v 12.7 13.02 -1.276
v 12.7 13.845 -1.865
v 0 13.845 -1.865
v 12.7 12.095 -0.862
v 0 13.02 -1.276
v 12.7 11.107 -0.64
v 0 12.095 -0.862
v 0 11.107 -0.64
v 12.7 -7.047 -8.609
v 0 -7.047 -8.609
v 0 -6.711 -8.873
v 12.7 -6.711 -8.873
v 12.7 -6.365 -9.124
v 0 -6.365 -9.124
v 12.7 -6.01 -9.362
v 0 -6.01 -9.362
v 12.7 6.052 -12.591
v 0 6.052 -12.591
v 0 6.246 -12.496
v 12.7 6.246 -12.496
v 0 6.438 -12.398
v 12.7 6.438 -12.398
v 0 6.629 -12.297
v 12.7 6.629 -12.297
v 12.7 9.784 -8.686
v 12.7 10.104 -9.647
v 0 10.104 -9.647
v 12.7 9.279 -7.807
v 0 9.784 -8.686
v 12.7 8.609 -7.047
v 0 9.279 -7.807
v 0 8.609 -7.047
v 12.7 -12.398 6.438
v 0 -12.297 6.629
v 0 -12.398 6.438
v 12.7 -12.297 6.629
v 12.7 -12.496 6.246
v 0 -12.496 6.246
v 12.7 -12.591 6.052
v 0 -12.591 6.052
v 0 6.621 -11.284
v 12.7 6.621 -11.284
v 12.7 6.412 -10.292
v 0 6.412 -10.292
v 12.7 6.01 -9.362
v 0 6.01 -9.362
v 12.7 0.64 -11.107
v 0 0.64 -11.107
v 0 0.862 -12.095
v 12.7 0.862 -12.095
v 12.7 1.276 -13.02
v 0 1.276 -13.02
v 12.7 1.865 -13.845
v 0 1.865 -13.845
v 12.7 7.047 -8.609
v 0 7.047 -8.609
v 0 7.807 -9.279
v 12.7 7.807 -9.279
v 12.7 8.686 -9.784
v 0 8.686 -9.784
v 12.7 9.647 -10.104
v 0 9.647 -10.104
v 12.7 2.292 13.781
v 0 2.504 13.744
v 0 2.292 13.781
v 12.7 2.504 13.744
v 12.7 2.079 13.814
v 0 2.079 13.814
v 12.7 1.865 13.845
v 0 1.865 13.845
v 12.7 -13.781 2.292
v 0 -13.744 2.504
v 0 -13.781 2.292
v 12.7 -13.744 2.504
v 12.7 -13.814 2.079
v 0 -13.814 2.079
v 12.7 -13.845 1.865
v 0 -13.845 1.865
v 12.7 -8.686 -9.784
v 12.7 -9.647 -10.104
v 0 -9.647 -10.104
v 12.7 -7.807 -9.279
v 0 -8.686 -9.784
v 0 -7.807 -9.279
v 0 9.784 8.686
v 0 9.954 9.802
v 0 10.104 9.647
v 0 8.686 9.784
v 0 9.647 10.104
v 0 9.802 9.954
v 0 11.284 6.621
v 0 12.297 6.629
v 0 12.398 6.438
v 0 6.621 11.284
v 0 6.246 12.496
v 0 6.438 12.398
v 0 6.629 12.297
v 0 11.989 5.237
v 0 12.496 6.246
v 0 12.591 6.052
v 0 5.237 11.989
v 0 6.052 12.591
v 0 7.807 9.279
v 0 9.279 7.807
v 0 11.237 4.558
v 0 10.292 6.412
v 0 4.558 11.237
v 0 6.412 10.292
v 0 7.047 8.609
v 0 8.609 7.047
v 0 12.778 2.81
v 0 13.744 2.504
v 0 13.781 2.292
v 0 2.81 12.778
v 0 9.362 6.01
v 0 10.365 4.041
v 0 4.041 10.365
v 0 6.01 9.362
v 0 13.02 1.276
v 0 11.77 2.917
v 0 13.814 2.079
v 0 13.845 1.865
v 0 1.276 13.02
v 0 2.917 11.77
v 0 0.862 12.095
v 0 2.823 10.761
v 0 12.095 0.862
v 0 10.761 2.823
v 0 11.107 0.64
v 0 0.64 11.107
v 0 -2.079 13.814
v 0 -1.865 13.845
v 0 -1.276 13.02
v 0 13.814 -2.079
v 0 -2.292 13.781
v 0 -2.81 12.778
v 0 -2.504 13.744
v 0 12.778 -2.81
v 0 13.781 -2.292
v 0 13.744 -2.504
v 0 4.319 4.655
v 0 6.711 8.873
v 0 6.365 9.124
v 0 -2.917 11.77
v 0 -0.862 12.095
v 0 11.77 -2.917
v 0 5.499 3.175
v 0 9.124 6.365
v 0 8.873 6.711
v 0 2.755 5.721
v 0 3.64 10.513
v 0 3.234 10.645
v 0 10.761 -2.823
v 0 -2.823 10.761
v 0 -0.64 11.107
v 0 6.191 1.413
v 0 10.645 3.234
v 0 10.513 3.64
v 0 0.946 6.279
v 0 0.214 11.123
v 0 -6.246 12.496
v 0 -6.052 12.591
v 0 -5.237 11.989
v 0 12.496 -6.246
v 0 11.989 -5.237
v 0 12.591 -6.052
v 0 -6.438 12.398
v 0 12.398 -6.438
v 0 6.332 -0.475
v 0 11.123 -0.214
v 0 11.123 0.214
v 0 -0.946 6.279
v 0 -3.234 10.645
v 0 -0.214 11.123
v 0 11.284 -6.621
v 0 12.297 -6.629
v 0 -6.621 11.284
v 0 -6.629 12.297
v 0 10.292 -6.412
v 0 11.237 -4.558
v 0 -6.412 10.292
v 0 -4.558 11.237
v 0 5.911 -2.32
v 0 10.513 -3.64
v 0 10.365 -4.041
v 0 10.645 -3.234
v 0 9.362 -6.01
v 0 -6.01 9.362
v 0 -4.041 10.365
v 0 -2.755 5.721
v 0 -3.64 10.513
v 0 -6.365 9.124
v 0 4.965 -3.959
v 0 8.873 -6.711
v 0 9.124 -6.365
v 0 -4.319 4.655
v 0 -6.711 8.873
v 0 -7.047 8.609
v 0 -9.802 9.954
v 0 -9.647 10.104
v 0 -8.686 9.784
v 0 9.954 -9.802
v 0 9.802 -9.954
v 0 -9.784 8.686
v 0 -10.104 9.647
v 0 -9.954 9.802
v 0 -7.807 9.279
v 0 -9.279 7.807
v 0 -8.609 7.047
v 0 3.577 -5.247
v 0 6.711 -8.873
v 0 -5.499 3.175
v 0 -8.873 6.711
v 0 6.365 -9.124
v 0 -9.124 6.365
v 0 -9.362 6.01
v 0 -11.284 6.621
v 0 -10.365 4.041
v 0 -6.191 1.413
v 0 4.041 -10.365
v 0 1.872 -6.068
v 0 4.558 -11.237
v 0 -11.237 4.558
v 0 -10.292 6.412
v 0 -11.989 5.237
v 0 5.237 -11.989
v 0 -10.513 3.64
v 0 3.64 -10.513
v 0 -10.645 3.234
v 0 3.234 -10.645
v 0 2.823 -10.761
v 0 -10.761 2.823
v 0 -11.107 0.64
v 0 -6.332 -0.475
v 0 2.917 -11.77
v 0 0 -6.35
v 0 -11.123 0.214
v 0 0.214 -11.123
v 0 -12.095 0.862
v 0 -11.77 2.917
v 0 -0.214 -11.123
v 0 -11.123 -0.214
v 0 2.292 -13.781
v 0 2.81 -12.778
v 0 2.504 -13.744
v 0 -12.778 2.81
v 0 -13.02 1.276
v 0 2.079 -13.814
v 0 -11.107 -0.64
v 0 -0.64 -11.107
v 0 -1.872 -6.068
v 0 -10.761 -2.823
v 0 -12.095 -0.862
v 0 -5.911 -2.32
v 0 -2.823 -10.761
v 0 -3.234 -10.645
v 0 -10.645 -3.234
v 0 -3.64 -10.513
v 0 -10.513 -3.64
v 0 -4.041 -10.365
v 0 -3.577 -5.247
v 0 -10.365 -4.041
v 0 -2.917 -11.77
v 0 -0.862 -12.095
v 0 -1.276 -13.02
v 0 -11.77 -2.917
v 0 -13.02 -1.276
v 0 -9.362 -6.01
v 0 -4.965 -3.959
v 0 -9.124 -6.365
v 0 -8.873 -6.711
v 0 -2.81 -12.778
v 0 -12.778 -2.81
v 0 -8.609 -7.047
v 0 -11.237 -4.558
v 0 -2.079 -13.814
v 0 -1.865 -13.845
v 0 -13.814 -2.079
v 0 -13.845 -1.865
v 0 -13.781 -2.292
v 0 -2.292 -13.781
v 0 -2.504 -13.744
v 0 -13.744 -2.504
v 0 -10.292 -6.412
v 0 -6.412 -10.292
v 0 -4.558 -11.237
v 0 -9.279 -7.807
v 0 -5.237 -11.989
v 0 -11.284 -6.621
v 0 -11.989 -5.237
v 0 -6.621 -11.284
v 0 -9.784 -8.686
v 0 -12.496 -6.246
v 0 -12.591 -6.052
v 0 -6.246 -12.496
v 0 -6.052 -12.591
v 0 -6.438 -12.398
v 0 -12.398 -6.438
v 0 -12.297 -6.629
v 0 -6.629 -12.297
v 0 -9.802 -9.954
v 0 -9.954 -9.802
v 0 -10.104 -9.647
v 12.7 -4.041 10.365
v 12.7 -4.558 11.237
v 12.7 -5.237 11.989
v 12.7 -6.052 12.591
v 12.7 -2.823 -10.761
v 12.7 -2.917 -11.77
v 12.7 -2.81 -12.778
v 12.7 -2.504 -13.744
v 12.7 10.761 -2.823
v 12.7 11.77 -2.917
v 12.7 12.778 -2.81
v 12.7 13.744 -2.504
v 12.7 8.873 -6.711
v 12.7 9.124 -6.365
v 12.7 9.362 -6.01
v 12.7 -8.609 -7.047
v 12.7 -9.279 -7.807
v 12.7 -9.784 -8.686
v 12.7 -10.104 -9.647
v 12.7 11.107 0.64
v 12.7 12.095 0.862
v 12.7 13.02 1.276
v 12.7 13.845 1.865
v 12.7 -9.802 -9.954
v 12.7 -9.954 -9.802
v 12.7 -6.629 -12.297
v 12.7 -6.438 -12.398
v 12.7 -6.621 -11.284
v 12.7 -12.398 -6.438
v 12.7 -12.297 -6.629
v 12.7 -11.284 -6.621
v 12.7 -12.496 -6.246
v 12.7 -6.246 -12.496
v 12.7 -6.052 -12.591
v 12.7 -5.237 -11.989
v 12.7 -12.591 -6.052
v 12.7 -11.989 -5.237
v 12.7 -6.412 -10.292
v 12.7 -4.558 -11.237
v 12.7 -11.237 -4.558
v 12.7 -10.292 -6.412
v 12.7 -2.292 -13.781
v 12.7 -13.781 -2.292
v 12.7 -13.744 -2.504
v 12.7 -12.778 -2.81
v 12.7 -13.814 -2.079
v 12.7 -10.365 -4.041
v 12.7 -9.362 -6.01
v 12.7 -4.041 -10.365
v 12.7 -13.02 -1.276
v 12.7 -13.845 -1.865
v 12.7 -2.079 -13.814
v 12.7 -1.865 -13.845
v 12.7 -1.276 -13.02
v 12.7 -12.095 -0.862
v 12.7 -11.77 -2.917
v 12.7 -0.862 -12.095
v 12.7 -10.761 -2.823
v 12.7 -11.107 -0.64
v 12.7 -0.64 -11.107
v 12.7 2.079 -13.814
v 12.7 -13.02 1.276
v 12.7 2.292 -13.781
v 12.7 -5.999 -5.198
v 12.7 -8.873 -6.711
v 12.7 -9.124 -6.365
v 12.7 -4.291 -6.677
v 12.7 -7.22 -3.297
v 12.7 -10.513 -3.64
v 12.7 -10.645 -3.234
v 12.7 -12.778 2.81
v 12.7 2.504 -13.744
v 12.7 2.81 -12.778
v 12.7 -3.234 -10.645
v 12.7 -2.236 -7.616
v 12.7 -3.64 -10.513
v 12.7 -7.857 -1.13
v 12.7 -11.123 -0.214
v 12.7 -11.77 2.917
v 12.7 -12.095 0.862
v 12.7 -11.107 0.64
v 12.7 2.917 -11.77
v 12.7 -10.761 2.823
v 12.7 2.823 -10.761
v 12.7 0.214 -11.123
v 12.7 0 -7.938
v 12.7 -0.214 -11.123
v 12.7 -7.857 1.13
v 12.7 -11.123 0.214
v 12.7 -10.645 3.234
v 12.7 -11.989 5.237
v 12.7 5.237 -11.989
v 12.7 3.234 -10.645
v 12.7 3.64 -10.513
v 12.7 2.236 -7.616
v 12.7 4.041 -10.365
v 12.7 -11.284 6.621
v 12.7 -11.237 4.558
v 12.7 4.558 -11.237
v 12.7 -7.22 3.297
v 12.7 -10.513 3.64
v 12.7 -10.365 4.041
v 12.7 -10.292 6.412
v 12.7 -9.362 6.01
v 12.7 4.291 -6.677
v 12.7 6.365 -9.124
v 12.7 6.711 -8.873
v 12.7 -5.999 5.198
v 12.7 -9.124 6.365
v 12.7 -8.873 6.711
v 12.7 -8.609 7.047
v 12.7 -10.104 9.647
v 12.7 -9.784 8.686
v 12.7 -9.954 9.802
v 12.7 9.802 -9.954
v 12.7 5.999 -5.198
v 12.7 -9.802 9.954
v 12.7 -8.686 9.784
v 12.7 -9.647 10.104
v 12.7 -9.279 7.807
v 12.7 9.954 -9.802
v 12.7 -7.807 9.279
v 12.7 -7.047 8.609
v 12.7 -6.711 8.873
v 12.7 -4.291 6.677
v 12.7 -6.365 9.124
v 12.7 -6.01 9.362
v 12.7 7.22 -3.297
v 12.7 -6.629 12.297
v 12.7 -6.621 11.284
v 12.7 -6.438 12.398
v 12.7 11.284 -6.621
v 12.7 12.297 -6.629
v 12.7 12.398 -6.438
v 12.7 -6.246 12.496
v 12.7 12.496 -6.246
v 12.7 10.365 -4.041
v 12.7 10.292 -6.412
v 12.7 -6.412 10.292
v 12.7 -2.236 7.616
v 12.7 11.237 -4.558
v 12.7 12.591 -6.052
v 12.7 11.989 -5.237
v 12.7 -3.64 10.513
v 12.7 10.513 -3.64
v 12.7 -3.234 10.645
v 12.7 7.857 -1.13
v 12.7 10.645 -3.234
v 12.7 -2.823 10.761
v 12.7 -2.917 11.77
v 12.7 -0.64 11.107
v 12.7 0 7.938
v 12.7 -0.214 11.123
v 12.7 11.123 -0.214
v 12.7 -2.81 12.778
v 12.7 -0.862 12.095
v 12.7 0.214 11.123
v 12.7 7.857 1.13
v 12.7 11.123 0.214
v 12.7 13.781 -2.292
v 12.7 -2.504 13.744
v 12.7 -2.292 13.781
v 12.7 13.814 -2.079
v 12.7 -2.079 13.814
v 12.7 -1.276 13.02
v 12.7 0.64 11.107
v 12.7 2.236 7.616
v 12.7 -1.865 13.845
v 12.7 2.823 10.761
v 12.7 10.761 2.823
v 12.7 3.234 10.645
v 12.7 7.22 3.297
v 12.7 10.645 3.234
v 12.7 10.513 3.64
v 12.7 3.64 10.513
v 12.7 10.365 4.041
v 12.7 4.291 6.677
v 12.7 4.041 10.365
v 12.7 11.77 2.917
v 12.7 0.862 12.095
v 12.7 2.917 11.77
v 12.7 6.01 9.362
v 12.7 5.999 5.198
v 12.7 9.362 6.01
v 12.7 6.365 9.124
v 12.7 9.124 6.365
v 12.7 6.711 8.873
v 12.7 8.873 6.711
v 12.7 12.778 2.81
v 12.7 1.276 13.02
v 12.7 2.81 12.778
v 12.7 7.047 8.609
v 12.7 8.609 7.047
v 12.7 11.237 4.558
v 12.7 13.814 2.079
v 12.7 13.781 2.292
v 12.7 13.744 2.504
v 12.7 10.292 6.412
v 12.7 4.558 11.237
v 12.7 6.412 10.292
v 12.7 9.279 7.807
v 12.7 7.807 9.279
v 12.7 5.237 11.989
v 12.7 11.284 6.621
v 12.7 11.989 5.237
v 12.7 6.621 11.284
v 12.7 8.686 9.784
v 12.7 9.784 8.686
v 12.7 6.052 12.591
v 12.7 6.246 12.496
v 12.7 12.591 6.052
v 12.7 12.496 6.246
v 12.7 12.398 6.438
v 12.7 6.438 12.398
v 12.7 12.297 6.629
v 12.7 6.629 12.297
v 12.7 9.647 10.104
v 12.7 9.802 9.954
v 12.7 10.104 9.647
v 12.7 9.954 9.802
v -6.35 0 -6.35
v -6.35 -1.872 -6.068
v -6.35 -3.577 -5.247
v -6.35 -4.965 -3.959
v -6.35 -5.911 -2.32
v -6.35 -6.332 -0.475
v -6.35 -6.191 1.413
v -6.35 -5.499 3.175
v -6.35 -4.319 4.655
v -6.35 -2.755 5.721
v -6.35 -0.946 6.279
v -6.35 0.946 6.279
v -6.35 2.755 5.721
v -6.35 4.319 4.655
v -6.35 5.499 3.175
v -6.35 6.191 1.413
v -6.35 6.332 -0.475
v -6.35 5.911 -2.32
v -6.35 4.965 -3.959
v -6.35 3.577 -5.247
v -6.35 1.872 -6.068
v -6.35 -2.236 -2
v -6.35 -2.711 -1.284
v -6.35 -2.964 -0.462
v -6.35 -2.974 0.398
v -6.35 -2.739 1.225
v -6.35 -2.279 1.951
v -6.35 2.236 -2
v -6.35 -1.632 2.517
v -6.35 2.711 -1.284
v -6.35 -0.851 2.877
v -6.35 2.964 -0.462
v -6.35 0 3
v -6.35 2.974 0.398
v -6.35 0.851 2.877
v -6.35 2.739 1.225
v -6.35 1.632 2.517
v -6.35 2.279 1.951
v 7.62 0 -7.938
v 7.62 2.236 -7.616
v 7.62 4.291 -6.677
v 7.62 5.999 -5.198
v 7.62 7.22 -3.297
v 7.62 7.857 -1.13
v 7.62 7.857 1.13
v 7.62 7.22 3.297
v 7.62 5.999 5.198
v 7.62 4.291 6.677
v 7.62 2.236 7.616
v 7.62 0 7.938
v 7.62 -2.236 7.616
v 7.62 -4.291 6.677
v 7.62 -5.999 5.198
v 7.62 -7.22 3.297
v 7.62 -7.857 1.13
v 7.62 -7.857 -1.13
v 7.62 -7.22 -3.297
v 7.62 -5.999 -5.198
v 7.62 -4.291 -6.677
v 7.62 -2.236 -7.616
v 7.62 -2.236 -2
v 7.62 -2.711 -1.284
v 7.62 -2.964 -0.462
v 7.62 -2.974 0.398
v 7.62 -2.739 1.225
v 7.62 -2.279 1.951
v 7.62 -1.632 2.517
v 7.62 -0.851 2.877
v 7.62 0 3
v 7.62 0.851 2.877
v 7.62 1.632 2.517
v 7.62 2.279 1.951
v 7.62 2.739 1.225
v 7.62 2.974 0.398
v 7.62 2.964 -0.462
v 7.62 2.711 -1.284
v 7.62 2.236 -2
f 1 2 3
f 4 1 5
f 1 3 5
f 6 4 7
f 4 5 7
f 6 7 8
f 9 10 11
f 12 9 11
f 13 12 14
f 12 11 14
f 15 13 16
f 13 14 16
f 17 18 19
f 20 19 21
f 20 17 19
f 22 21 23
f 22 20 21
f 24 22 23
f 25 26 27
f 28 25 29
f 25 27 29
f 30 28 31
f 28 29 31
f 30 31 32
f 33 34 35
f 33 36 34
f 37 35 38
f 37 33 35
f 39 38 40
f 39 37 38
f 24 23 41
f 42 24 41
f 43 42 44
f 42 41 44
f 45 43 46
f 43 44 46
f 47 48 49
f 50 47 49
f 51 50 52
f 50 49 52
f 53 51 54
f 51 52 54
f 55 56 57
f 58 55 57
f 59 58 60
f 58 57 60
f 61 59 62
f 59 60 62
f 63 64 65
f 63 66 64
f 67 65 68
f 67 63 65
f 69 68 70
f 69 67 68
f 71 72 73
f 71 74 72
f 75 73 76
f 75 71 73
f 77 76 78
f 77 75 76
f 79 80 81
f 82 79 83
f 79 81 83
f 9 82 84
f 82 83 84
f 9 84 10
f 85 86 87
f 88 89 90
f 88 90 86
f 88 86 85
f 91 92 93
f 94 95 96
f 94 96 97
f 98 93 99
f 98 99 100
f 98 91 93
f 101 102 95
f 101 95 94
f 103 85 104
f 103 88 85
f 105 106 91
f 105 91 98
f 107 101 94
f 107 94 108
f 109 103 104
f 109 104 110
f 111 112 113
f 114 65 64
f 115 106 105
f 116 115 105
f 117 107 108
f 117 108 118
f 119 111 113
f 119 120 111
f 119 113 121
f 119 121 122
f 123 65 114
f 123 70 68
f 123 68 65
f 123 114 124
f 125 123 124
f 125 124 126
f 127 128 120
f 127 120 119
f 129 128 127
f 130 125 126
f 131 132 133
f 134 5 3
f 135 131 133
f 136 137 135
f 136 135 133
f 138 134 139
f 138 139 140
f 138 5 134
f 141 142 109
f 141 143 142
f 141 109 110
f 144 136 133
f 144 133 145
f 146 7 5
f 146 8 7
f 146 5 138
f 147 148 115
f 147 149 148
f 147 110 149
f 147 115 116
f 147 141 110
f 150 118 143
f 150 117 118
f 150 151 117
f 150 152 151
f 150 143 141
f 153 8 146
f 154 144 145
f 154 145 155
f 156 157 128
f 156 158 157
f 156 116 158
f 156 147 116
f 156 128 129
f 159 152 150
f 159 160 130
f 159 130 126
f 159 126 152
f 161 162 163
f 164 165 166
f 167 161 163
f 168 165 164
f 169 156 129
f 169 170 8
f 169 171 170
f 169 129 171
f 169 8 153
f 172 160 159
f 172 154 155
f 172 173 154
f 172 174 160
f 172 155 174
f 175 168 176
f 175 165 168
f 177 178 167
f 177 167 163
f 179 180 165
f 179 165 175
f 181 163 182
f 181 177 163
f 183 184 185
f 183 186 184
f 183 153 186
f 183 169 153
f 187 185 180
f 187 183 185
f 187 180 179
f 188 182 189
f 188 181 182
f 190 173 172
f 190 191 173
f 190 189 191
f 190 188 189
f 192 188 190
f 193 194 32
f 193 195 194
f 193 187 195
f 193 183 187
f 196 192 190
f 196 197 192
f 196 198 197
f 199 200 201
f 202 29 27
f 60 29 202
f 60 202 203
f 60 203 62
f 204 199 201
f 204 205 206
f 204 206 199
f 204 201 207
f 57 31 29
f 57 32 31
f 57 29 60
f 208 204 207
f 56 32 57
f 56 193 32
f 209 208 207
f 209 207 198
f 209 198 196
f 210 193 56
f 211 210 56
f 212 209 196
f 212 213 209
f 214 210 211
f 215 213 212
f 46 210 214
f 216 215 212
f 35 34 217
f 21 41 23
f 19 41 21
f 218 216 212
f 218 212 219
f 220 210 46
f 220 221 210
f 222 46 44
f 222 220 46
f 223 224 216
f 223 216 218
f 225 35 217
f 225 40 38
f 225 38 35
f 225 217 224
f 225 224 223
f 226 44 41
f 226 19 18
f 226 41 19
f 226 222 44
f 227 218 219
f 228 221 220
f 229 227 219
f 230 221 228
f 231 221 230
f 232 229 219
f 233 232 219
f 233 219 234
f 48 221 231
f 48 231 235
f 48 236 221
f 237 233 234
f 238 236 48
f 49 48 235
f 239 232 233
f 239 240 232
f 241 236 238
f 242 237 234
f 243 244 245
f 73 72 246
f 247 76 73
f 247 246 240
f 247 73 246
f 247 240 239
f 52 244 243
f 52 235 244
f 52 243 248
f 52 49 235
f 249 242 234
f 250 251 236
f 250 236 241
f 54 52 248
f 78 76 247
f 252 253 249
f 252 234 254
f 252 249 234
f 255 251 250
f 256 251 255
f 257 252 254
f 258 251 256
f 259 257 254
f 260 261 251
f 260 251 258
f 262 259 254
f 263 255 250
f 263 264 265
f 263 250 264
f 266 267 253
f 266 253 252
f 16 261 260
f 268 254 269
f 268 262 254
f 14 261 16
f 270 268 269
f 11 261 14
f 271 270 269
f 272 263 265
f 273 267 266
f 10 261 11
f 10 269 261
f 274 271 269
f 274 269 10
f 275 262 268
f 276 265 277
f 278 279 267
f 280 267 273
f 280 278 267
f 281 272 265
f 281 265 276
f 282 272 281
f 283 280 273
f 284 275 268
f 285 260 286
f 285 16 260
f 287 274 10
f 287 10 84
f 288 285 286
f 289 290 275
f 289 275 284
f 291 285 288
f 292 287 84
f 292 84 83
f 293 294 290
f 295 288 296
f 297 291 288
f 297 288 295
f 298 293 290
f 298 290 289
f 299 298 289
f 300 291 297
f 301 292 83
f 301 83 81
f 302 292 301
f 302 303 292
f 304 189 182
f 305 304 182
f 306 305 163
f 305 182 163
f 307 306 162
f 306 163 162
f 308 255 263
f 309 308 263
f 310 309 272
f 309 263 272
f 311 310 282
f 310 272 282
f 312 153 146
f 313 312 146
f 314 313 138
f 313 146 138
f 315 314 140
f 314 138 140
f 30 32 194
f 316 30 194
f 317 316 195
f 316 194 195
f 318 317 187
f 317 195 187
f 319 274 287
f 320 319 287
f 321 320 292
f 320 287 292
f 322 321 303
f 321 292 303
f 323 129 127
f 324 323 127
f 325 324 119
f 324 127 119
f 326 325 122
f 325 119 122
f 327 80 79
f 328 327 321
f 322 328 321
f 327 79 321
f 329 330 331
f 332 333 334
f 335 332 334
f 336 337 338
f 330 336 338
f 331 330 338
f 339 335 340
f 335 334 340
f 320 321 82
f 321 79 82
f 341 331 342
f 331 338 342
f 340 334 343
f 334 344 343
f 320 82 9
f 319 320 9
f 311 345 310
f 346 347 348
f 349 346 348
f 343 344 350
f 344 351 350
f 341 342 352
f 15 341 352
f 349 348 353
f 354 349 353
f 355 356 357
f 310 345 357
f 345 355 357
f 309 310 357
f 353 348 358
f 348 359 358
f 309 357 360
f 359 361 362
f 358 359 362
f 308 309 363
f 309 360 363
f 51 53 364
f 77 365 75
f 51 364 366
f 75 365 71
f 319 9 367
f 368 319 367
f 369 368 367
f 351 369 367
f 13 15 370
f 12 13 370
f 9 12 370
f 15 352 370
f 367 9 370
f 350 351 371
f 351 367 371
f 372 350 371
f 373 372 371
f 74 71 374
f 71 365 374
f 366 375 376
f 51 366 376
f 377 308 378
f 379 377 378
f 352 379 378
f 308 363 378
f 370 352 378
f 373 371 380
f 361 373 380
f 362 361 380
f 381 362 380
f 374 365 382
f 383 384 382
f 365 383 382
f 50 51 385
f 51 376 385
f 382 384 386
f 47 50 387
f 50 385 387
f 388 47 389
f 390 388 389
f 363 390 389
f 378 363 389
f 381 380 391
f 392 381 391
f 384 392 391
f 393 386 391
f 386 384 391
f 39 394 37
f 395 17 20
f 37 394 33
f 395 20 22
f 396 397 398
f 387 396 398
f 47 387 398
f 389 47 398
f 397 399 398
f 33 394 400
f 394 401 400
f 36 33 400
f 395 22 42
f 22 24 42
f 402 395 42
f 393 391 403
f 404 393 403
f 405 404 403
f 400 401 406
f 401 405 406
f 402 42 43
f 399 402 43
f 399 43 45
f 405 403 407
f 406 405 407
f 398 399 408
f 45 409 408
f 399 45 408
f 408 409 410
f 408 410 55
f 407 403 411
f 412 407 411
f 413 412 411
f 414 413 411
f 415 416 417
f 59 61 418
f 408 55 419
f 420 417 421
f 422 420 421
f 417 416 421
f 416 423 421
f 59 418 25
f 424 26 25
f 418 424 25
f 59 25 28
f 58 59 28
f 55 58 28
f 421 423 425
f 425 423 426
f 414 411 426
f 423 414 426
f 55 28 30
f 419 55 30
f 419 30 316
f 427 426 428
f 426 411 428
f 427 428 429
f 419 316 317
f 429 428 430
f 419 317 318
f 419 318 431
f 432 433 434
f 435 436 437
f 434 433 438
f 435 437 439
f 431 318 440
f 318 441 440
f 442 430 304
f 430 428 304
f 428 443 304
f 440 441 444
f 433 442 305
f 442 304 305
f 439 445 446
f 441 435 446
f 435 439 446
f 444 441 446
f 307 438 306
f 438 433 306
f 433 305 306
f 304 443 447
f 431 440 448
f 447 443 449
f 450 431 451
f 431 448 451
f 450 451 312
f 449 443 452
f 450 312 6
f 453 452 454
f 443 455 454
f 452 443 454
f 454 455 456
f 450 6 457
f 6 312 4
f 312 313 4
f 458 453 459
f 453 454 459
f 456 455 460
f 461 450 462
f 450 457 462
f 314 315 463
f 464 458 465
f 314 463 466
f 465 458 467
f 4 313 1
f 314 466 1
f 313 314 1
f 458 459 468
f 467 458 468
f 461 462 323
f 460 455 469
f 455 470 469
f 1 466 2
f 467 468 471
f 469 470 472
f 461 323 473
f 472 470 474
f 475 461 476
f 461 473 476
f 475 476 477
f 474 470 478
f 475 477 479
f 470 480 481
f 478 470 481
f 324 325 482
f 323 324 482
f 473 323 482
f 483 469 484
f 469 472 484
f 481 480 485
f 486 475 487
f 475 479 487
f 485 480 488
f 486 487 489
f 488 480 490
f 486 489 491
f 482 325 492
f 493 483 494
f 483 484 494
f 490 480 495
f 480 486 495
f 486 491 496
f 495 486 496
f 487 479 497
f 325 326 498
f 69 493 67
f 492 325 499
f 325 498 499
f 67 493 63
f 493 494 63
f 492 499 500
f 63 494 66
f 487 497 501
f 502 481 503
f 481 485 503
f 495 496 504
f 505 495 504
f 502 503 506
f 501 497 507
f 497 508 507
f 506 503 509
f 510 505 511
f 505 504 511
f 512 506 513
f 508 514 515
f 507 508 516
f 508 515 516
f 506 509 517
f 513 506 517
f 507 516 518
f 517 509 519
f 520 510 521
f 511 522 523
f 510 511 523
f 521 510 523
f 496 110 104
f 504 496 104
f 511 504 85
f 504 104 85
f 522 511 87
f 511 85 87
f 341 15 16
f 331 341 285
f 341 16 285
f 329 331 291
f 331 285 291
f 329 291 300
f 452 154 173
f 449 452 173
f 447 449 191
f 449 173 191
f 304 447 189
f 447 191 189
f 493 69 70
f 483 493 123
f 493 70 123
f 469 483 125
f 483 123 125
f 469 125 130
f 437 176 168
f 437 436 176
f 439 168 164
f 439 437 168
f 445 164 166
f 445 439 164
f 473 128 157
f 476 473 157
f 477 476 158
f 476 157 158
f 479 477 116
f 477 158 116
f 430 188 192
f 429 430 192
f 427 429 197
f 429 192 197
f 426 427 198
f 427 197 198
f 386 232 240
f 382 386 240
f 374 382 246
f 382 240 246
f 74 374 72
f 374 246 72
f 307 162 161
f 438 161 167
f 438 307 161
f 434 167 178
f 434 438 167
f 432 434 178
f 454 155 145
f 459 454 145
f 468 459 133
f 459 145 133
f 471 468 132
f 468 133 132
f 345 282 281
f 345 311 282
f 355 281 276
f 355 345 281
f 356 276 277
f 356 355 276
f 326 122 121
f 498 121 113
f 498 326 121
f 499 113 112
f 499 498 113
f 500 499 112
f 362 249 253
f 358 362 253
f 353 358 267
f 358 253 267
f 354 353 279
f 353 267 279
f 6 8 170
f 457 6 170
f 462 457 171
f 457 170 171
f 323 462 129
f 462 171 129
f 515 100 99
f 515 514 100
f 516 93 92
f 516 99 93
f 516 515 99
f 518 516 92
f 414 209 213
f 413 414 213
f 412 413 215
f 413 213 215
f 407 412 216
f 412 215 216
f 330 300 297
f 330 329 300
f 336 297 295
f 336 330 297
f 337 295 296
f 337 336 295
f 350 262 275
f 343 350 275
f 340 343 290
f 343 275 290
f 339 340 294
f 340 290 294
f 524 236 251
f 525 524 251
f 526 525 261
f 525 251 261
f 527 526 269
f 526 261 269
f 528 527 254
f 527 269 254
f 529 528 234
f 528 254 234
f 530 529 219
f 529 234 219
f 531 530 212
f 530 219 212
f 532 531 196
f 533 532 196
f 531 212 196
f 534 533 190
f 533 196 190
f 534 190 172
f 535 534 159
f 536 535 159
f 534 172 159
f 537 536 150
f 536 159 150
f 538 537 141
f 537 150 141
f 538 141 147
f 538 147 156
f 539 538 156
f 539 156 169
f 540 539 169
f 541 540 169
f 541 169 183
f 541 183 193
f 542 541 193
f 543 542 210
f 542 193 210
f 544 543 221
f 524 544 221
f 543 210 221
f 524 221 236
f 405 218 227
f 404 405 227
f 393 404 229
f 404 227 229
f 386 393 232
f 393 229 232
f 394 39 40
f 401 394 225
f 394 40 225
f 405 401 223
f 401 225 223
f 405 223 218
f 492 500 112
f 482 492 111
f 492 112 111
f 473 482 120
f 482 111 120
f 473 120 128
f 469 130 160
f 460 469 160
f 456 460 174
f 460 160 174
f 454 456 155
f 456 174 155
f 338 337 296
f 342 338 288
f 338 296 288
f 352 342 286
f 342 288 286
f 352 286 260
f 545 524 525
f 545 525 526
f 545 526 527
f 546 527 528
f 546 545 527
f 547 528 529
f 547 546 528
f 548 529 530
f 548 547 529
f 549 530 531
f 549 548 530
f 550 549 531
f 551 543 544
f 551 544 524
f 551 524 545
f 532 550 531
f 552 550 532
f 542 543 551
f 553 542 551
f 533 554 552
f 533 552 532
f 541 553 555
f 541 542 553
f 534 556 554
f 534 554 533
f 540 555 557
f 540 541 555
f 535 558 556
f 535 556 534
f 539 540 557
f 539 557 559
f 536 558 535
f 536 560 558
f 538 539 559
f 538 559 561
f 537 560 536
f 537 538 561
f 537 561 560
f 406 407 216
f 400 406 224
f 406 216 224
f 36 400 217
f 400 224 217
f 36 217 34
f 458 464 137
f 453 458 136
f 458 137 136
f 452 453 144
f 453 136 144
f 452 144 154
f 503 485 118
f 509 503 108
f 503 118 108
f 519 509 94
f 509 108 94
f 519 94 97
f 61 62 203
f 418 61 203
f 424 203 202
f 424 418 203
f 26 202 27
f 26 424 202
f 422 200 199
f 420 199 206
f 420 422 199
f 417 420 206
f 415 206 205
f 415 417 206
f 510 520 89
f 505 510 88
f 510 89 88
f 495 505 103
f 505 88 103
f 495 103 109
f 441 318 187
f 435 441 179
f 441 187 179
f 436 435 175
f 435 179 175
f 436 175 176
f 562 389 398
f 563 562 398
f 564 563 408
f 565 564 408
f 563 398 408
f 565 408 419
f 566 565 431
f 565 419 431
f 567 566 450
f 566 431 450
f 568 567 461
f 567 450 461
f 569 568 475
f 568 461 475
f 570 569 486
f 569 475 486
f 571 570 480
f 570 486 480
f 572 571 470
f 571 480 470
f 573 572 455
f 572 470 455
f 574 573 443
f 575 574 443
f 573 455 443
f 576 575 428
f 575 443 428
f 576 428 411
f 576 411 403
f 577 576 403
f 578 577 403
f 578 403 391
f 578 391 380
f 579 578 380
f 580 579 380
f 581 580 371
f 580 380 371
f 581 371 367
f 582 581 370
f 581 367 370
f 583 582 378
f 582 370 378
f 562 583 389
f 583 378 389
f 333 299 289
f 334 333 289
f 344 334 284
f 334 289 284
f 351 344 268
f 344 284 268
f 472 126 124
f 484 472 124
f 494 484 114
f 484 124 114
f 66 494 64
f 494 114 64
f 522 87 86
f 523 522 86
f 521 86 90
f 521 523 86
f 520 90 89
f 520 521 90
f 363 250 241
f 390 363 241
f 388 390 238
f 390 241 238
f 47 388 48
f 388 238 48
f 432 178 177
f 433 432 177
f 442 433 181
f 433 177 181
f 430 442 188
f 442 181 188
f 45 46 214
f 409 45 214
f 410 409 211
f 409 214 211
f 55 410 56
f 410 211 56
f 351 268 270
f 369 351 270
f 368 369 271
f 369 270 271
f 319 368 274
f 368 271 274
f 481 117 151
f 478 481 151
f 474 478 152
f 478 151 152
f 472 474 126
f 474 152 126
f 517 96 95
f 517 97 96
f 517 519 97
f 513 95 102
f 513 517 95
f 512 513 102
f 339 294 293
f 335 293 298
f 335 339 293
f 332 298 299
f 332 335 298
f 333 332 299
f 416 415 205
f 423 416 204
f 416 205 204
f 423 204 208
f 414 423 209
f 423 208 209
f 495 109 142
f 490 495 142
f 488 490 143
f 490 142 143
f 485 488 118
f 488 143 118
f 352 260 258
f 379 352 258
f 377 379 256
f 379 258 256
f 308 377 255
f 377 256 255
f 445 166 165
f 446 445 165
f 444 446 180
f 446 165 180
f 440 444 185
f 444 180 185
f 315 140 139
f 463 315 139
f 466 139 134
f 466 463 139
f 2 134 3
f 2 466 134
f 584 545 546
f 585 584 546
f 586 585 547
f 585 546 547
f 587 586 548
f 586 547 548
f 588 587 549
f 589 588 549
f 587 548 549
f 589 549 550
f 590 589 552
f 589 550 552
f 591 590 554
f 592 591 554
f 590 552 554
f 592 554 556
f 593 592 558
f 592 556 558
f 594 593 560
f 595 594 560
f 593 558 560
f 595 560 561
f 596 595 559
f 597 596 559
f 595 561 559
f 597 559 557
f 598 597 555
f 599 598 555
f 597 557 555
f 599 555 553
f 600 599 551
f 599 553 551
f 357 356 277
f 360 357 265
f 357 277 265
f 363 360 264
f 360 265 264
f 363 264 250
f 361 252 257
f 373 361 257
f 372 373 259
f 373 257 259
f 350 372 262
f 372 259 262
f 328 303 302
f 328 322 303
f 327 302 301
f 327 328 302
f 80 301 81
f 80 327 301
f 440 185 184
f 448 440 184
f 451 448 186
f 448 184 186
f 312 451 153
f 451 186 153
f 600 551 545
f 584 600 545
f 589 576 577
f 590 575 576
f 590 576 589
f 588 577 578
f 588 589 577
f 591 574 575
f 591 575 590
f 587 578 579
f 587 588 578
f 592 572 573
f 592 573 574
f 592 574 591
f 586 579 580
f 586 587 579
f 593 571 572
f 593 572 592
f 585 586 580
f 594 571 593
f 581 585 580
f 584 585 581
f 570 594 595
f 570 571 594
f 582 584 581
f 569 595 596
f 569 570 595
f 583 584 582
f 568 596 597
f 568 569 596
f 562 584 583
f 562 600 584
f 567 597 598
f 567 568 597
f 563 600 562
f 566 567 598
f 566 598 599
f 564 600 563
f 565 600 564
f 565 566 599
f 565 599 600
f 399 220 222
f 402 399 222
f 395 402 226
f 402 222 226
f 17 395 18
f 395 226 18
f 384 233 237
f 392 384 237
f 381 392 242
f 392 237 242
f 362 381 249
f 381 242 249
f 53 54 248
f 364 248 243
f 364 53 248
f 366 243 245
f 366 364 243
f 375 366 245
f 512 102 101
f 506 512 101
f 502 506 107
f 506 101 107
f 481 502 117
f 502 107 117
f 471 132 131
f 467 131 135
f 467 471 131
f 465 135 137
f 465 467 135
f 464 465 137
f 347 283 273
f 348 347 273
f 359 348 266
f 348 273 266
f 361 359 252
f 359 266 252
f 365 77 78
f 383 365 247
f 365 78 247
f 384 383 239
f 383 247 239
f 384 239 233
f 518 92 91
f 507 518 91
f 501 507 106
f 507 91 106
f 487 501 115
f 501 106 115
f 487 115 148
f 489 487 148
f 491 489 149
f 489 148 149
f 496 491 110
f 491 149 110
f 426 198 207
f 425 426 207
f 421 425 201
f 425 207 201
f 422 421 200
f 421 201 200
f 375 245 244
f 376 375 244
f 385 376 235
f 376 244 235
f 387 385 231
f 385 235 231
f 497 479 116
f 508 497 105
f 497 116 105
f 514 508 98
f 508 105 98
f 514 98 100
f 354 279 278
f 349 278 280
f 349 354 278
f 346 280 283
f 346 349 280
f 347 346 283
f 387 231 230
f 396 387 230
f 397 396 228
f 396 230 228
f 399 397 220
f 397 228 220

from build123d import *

# Parameters (mm, degrees)
BASPROSKE_W         = 12.7
BASPROSKE_H         = 13.97
TOOTHCUT_DEPTH      = 24.486417351
TEETHCUTS_COUNT     = 20
HUBNEAONESKE_R      = 6.35
HUBNEARONE_DEPTH    = 6.3502032
BORSKE_R            = 3.175
BORE_DEPTH          = 19.0502032
SKETCH1_R           = 3.175
BOSS_EXTRUDE1_DEPTH = 19.0502032
SKETCH2_R           = 7.9375
CUT_EXTRUDE1_DEPTH  = 5.08


with BuildPart() as part:
    # BasProSke → Base-Revolve (revolve)
    with BuildSketch(Plane(origin=(0, 0, 0), x_dir=(1, 0, 0), z_dir=(0, 1, 0)), mode=Mode.PRIVATE) as base_revolve_sk:
        with Locations((6.35, 6.985)):
            Rectangle(BASPROSKE_W, BASPROSKE_H)
    revolve(base_revolve_sk.sketch.rotate(Axis((-10, 0, 0), (1, 0, 0)), 180), axis=Axis((-10, 0, 0), (1, 0, 0)))

    # TooCutSke → ToothCut (cut, through all)
    with BuildSketch(Plane(origin=(0, 0, 0), x_dir=(0, 0, -1), z_dir=(1, 0, 0))):
        with BuildLine():
            ThreePointArc((0.64046545, 11.106749257), (0, 11.1252), (-0.64046545, 11.106749257))
            ThreePointArc((-0.64046545, 11.106749257), (-1.052455812, 12.582227662), (-1.8855699, 13.867798935))
            ThreePointArc((-1.8855699, 13.867798935), (0, 13.9954), (1.8855699, 13.867798935))
            ThreePointArc((1.8855699, 13.867798935), (1.052455812, 12.582227662), (0.64046545, 11.106749257))
        make_face()
    toothcut = extrude(amount=TOOTHCUT_DEPTH, mode=Mode.SUBTRACT)

    # TeethCuts: ToothCut ×20 about axis
    teethcuts_axis = Axis((-10, 0, 0), (1, 0, 0))
    for i in range(1, TEETHCUTS_COUNT):
        add(toothcut.rotate(teethcuts_axis, i * 360 / TEETHCUTS_COUNT), mode=Mode.SUBTRACT)

    # HubNeaOneSke → HubNearOne (add)
    with BuildSketch(Plane.ZY):
        with Locations(Location((0, 0, 0), (0, 0, 180))):
            Circle(HUBNEAONESKE_R)
    extrude(amount=HUBNEARONE_DEPTH)

    # BorSke → Bore (cut, symmetric)
    with BuildSketch(Plane(origin=(0, 0, 0), x_dir=(0, 0, -1), z_dir=(1, 0, 0))):
        with Locations(Location((0, 0, 0), (0, 0, 180))):
            Circle(BORSKE_R)
    extrude(amount=BORE_DEPTH, both=True, mode=Mode.SUBTRACT)

    # Sketch1 → Boss-Extrude1 (add)
    with BuildSketch(Plane.ZY.offset(6.3502032)):
        Circle(SKETCH1_R)
        with BuildLine():
            Line((-2, 2.236067977), (-2, -2.236067977))
            ThreePointArc((-2, -2.236067977), (3, 0), (-2, 2.236067977))
        make_face(mode=Mode.SUBTRACT)
    extrude(amount=-BOSS_EXTRUDE1_DEPTH)

    # Sketch2 → Cut-Extrude1 (cut)
    with BuildSketch(Plane(origin=(12.7, 0, 0), x_dir=(0, 0, -1), z_dir=(1, 0, 0))):
        Circle(SKETCH2_R)
    extrude(amount=-CUT_EXTRUDE1_DEPTH, mode=Mode.SUBTRACT)


solid = part.part
